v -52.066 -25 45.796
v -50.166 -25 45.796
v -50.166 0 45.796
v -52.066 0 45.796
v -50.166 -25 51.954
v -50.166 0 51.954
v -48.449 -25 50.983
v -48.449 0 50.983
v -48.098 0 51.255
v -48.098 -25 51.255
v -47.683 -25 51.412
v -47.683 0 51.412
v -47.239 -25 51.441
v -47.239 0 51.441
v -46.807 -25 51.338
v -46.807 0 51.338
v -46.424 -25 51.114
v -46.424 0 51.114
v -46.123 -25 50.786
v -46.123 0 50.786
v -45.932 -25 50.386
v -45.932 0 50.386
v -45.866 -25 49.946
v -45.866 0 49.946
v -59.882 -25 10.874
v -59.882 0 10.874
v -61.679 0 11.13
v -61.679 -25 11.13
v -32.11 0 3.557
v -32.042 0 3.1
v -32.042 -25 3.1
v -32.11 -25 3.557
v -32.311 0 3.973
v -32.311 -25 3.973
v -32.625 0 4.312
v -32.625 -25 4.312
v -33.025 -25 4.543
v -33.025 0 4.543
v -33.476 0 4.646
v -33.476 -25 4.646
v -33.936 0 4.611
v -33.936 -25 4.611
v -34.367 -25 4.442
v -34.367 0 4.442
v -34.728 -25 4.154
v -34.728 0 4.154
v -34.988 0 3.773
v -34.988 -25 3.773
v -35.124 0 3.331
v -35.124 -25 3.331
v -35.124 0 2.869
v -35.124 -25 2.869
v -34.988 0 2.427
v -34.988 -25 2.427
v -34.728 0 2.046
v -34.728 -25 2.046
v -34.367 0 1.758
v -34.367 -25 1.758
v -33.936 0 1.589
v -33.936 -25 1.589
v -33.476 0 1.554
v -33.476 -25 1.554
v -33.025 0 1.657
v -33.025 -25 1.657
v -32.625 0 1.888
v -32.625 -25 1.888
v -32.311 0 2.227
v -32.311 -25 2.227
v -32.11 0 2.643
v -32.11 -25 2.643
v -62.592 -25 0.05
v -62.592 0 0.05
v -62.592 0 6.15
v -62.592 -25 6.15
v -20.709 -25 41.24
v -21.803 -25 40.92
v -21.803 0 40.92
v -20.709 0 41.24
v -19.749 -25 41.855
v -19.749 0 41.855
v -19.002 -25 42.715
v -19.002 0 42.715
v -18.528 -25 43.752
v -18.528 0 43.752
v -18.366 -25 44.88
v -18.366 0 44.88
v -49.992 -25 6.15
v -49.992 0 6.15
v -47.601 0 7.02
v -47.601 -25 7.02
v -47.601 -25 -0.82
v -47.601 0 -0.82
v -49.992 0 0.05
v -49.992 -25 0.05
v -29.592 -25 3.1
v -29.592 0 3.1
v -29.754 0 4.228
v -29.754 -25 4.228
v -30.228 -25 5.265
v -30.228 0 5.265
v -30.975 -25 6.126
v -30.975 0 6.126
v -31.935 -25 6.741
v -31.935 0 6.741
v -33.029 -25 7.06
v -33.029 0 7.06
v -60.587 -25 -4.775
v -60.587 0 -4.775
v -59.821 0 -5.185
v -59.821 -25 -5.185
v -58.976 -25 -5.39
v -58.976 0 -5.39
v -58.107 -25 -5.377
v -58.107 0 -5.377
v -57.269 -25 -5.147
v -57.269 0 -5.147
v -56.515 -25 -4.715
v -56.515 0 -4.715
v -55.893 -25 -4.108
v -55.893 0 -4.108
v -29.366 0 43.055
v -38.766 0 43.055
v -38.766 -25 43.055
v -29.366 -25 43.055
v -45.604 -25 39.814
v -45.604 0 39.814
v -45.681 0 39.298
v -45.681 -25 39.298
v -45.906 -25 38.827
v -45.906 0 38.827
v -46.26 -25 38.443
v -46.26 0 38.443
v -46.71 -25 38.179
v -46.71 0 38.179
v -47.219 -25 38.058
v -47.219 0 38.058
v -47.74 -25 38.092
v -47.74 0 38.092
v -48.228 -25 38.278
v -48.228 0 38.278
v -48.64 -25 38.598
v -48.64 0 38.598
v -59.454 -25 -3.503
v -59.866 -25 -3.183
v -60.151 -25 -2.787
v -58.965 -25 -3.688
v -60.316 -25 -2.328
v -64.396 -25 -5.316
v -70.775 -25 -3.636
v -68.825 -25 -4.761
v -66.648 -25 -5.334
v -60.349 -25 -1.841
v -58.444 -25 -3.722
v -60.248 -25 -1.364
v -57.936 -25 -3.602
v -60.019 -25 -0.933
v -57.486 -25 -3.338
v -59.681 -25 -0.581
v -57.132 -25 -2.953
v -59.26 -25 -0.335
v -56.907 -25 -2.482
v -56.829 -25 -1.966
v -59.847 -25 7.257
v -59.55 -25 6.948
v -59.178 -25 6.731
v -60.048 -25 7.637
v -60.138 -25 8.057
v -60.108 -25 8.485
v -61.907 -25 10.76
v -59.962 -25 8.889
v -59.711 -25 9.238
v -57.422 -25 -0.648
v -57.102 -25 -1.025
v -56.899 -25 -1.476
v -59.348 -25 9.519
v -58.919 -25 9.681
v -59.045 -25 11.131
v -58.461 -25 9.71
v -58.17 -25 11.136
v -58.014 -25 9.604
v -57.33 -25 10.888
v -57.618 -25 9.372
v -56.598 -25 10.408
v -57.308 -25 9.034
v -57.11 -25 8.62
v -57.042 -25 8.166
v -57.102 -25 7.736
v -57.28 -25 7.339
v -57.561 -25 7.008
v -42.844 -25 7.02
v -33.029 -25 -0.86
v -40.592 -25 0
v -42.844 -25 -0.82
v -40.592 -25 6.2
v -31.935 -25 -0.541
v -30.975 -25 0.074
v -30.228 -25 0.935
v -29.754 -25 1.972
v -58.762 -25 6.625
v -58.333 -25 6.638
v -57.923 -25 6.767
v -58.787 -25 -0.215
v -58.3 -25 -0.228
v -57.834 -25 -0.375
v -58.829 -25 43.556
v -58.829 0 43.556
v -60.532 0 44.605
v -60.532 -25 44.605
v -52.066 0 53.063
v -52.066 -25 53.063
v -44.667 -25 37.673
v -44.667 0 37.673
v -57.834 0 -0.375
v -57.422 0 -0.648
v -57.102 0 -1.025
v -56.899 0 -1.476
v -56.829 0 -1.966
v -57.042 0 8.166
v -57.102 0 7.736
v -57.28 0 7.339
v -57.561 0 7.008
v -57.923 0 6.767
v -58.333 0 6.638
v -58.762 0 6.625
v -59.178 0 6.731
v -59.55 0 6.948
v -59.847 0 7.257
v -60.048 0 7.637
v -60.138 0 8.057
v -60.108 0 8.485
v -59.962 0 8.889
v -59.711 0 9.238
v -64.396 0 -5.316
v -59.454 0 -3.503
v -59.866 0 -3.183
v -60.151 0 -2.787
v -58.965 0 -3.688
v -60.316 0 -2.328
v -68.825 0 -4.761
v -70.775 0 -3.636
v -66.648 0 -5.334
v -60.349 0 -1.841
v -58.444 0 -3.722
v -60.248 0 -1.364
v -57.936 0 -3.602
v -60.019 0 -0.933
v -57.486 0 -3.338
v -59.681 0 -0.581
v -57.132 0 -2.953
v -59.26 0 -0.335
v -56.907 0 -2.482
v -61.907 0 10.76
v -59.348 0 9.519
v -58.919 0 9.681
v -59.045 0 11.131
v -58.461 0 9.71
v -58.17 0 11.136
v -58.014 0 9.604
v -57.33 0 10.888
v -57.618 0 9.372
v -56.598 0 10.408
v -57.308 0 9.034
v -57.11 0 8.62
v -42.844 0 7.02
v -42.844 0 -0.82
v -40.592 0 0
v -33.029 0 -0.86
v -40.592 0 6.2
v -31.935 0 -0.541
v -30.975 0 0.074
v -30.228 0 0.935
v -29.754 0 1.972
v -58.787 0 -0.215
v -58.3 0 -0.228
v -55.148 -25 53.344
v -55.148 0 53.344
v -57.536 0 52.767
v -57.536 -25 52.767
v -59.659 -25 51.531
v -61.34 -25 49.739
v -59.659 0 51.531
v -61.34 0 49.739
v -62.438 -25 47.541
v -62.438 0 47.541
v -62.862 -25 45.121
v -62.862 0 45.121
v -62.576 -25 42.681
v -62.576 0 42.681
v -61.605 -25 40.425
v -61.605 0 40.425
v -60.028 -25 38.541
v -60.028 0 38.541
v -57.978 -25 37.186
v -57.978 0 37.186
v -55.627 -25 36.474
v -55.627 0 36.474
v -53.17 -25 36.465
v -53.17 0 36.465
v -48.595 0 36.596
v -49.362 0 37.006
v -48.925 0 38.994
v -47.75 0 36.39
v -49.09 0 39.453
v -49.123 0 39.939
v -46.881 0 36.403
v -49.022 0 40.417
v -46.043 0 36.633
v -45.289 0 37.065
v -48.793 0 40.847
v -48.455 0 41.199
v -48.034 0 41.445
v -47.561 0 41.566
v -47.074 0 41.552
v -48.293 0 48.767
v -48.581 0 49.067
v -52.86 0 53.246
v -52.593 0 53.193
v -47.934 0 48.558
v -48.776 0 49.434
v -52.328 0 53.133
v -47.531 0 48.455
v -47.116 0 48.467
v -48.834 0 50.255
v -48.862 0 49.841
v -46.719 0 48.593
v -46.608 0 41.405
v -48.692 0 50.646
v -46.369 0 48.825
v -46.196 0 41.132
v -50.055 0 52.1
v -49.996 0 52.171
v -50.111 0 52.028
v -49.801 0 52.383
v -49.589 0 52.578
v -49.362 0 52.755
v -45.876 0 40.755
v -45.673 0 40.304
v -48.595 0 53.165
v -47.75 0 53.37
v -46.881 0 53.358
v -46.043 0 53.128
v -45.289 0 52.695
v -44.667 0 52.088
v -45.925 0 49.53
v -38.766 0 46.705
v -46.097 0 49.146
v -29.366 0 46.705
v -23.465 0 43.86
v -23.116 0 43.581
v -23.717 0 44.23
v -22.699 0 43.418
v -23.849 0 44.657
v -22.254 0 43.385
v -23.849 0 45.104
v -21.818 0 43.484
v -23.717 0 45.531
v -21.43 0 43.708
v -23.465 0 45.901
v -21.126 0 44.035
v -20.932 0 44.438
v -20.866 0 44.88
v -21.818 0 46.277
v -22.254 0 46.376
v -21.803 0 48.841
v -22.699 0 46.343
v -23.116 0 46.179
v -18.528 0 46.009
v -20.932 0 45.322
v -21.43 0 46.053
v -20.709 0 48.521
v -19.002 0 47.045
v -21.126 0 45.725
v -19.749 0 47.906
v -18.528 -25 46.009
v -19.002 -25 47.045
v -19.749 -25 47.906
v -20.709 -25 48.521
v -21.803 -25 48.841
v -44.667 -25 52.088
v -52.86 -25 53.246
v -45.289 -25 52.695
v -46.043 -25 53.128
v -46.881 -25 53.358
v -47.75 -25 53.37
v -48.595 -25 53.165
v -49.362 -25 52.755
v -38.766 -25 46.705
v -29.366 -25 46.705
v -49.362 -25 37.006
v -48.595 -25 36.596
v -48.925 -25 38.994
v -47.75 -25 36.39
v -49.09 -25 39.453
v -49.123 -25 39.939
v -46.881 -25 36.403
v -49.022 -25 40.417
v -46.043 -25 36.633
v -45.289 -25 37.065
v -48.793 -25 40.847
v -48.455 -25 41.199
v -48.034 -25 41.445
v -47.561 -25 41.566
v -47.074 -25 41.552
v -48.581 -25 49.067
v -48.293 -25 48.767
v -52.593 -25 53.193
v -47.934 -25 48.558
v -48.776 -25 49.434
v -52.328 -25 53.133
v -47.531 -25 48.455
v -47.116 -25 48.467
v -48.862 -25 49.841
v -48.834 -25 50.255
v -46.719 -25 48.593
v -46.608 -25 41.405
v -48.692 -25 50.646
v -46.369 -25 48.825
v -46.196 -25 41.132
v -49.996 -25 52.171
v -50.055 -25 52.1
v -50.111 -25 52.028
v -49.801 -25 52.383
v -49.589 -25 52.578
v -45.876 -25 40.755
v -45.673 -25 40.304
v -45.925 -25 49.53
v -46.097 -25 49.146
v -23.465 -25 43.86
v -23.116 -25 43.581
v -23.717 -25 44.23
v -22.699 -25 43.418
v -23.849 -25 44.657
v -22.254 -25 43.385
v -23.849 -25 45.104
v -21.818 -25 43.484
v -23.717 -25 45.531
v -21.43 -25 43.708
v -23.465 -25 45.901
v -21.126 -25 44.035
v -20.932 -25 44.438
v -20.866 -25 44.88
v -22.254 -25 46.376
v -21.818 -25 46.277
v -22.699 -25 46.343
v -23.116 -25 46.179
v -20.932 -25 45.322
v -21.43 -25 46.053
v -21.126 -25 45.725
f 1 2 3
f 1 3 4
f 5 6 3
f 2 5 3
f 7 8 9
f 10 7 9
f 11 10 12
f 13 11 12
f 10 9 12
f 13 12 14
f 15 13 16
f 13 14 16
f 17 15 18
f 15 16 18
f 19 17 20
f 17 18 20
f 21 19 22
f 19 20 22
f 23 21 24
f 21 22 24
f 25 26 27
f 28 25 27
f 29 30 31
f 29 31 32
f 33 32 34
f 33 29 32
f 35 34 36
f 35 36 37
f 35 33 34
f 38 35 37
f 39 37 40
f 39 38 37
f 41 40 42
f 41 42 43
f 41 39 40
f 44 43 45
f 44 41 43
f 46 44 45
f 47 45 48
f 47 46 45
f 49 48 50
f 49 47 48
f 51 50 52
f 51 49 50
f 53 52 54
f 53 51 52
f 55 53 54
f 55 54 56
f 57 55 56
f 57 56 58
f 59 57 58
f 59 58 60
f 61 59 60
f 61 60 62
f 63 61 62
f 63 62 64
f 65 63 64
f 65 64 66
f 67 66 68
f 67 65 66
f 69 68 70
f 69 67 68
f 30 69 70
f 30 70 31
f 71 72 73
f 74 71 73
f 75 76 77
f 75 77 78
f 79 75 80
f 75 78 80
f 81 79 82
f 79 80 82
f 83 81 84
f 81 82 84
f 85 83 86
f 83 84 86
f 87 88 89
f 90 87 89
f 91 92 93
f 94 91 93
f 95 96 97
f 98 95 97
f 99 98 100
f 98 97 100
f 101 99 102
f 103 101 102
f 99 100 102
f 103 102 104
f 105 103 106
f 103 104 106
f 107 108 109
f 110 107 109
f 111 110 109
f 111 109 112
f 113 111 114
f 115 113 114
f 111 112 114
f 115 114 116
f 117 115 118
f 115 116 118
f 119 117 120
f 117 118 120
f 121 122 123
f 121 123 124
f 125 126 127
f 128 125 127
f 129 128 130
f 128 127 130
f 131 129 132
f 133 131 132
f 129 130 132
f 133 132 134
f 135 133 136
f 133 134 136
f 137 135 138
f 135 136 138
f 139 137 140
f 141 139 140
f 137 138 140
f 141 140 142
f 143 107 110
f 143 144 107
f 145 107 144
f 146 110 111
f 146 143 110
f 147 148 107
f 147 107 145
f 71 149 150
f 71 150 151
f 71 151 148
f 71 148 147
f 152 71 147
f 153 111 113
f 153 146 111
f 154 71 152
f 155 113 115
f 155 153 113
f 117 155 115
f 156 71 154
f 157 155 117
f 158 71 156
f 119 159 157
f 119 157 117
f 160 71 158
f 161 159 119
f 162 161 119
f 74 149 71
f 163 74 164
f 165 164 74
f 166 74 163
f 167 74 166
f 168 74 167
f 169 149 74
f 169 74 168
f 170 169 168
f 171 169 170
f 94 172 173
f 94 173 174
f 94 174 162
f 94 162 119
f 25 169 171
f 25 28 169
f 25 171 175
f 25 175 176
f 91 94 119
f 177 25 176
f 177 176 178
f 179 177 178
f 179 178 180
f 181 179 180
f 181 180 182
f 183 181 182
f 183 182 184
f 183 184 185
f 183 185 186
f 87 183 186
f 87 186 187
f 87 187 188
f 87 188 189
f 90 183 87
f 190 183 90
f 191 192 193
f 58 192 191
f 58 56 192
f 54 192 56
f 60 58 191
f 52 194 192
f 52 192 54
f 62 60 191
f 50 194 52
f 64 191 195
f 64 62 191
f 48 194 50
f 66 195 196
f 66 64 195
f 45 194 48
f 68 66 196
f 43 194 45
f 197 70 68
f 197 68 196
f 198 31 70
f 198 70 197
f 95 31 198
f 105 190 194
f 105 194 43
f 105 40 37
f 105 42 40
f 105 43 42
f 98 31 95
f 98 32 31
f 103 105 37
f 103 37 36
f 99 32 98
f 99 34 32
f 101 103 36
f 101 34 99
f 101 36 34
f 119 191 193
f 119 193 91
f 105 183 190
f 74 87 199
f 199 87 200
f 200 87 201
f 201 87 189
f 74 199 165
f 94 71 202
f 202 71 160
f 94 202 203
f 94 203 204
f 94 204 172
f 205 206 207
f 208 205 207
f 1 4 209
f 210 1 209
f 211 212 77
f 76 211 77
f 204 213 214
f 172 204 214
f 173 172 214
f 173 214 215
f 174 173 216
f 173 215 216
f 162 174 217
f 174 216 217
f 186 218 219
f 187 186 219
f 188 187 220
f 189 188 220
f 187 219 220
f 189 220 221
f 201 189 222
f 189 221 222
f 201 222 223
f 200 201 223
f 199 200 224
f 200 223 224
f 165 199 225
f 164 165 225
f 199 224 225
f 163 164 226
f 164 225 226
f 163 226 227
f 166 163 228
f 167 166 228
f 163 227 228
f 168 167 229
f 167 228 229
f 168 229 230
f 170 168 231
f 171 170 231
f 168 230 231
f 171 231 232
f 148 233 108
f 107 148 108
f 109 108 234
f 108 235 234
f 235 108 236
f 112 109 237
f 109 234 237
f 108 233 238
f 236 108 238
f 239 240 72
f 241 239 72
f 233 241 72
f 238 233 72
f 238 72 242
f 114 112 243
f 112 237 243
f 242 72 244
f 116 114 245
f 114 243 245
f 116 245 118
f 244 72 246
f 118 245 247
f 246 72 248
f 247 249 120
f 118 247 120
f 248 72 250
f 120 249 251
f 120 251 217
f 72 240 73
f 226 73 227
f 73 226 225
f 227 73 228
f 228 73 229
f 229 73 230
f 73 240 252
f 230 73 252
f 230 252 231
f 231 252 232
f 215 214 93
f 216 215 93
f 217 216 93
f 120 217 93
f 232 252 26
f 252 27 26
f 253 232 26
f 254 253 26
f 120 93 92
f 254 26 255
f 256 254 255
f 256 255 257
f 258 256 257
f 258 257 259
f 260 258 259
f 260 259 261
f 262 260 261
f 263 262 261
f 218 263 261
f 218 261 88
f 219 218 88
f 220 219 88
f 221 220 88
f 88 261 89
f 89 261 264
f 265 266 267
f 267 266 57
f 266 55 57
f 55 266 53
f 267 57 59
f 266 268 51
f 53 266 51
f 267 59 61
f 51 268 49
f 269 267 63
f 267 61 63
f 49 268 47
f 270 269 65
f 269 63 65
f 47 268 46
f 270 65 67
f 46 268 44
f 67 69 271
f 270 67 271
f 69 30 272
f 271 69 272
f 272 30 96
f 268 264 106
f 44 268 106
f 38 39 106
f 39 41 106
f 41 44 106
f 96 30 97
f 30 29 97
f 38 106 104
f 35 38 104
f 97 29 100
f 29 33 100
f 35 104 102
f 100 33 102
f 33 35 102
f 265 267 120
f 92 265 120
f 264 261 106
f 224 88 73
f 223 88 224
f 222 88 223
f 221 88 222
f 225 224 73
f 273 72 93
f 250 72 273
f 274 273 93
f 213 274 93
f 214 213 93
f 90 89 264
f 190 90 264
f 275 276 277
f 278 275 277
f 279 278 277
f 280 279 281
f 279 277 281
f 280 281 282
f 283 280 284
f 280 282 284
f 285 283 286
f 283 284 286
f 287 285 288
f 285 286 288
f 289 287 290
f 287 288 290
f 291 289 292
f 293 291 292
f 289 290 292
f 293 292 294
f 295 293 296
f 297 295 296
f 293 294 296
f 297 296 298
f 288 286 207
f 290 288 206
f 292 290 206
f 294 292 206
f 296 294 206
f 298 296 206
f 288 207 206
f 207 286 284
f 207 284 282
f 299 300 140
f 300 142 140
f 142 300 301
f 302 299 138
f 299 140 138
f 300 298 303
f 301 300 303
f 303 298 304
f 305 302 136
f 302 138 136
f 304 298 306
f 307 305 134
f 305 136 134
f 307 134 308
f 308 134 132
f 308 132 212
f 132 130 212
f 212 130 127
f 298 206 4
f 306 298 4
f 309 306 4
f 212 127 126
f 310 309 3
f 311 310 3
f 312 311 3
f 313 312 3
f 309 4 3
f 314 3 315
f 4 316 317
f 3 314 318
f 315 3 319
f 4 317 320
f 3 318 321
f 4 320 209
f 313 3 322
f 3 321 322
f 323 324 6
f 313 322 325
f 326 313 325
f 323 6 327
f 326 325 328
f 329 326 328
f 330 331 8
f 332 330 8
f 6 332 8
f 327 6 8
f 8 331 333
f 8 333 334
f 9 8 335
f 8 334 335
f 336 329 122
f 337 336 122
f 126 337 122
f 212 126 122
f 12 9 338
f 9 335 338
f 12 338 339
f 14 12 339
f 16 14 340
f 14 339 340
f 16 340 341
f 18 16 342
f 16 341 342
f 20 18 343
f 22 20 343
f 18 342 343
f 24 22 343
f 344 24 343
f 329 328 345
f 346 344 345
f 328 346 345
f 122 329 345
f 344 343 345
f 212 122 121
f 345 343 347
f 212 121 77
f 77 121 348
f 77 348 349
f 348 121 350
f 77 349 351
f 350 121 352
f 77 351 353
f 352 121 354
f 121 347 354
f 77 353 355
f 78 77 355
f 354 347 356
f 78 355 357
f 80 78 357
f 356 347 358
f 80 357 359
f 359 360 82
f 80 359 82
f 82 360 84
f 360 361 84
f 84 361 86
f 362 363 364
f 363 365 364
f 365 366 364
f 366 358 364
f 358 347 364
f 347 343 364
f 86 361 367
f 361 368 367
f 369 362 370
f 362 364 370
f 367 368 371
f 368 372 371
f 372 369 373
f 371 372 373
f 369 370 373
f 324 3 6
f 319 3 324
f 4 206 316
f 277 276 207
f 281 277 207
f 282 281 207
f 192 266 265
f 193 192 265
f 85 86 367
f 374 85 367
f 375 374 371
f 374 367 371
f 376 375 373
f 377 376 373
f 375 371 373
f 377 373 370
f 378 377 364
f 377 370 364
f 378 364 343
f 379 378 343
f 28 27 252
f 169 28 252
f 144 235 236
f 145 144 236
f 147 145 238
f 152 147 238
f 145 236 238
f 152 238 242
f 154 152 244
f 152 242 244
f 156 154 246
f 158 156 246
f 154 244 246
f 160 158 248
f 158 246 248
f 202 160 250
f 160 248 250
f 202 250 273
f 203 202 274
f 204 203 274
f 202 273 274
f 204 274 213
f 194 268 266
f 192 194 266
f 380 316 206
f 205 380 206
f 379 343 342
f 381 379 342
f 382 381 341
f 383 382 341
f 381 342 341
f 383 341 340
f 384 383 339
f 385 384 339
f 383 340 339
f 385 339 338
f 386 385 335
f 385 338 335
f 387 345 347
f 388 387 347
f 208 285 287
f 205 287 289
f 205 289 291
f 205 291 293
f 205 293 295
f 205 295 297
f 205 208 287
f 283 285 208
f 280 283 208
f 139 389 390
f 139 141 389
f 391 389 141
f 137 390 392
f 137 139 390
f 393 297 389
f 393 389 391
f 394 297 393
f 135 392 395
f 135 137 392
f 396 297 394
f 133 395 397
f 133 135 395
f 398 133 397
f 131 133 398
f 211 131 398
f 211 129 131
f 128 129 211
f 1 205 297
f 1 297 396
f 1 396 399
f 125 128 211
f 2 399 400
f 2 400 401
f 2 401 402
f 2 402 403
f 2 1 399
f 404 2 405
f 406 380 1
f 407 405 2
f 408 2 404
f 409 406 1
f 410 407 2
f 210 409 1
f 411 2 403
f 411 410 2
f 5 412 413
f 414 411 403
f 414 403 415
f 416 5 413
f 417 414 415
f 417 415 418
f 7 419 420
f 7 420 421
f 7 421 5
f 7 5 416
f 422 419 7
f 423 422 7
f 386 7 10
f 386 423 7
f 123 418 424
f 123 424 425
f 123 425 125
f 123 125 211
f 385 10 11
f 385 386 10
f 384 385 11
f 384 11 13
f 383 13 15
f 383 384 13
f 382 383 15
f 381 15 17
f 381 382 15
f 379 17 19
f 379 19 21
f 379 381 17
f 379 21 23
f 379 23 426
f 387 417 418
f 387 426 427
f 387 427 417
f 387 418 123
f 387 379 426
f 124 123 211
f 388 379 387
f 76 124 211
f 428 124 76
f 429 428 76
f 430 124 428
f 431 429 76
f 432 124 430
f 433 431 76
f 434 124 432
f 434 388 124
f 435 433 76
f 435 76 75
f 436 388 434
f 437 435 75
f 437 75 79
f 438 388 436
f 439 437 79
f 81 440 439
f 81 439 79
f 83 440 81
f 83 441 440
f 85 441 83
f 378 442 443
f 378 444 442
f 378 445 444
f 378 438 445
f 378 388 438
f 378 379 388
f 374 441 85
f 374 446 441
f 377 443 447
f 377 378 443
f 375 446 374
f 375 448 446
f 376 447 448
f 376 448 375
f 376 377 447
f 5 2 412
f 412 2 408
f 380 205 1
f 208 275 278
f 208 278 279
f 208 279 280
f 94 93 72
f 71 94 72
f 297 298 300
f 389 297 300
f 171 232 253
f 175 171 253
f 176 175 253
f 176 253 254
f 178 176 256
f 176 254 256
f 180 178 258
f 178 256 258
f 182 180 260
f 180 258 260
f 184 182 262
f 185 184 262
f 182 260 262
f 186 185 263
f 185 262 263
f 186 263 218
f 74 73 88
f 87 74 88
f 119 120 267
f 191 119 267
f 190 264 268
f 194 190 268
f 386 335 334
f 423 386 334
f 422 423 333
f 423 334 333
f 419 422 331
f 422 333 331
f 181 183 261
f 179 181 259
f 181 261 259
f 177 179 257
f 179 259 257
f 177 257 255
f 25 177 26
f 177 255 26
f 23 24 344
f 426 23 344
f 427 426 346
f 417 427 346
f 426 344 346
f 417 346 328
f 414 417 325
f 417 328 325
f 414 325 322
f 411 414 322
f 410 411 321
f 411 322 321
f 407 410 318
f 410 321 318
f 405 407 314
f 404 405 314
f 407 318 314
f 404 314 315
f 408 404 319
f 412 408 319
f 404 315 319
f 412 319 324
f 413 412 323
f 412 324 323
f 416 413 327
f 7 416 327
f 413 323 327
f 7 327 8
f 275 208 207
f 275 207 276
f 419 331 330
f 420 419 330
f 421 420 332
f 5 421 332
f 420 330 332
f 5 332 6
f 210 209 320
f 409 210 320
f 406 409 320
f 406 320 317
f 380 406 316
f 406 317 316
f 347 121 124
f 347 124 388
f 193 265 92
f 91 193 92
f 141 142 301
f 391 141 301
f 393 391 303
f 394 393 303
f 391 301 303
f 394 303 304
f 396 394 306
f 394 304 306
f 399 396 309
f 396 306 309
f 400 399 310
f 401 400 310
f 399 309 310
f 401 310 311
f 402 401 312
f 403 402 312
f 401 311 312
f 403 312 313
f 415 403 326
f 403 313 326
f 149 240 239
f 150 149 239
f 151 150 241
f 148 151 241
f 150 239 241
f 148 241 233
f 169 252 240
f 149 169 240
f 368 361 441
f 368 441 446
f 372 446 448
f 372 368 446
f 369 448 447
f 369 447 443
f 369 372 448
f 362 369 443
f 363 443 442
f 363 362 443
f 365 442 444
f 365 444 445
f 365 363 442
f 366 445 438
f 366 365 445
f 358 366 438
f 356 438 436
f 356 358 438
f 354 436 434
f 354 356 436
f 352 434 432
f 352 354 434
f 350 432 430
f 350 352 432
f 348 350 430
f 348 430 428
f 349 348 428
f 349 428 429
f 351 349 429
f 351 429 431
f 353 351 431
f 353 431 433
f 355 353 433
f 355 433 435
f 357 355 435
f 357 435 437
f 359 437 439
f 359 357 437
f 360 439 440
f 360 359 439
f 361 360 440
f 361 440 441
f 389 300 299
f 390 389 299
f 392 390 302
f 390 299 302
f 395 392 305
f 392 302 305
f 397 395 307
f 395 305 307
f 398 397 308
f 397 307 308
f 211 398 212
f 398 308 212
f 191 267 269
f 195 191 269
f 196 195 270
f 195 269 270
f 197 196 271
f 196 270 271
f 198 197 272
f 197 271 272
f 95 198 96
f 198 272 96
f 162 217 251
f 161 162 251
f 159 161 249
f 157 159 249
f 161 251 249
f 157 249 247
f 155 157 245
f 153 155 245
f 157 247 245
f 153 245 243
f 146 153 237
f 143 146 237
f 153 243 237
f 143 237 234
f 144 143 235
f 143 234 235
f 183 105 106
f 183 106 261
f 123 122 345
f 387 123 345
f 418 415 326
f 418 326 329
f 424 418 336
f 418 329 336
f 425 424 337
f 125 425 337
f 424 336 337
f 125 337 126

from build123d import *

# Parameters (mm, degrees)
F0_R     = 1.5
F0_W     = 9.4
F0_H     = 3.65
F1_DEPTH = 25
F0_R_2   = 1.55


with BuildPart() as f1:
    # F0 (on Front) → F1 (new body)
    with BuildSketch(Plane.XZ):
        with BuildLine():
            Line((-49.3615542974, 52.7548726737), (-44.6667412439, 52.0880382086))
            ThreePointArc((-44.6667412439, 52.0880382086), (-46.8811865433, 53.357561984), (-49.3615542974, 52.7548726737))
        make_face()
        with BuildLine():
            ThreePointArc((-49.3615542974, 37.0057918546), (-46.8811865433, 36.4031025443), (-44.6667412439, 37.6726263196))
            Line((-44.6667412439, 37.6726263196), (-49.3615542974, 37.0057918546))
        make_face()
        with BuildLine():
            ThreePointArc((-49.3615542974, 37.0057918546), (-49.6973054486, 37.2776069924), (-49.9964053831, 37.5892984006))
            ThreePointArc((-49.9964053831, 37.5892984006), (-51.5271600553, 36.8683017678), (-53.1703977707, 36.4647973419))
            Line((-53.1703977707, 36.4647973419), (-49.3615542974, 37.0057918546))
        make_face()
        with BuildLine():
            ThreePointArc((-18.3657102707, 44.8803322641), (-19.3449487773, 47.5023543846), (-21.8032102707, 48.8405839922))
            ThreePointArc((-21.8032102707, 48.8405839922), (-26.3657102707, 44.8803322641), (-21.8032102707, 40.920080536))
            ThreePointArc((-21.8032102707, 40.920080536), (-19.3449487773, 42.2583101437), (-18.3657102707, 44.8803322641))
        make_face()
        with Locations((-22.3657102707, 44.8803322641)):
            Circle(F0_R, mode=Mode.SUBTRACT)
        with BuildLine():
            ThreePointArc((-46.7192717295, 48.5927408672), (-46.3438242586, 47.690909573), (-46.0743279136, 46.751956855))
            ThreePointArc((-46.0743279136, 46.751956855), (-44.5090561942, 48.0198994141), (-43.9202082096, 49.9462981111))
            ThreePointArc((-43.9202082096, 49.9462981111), (-44.1121900389, 51.0803574368), (-44.6667412439, 52.0880382086))
            Line((-44.6667412439, 52.0880382086), (-49.3615542974, 52.7548726737))
            ThreePointArc((-49.3615542974, 52.7548726737), (-49.6973054486, 52.4830575358), (-49.9964053831, 52.1713661277))
            ThreePointArc((-49.9964053831, 52.1713661277), (-49.1887221415, 51.6219043293), (-48.4494153042, 50.9834014813))
            ThreePointArc((-48.4494153042, 50.9834014813), (-46.806942676, 51.3383393372), (-45.8657102707, 49.9462981111))
            ThreePointArc((-45.8657102707, 49.9462981111), (-46.096919939, 49.1461911844), (-46.7192717295, 48.5927408672))
        make_face()
        with BuildLine():
            ThreePointArc((-43.9202082096, 39.8143664172), (-44.5090561942, 41.7407651142), (-46.0743279136, 43.0087076733))
            ThreePointArc((-46.0743279136, 43.0087076733), (-46.3014397022, 42.1937842564), (-46.6084329672, 41.4054727221))
            ThreePointArc((-46.6084329672, 41.4054727221), (-45.875826677, 40.7552888716), (-45.6035842286, 39.8143664172))
            ThreePointArc((-45.6035842286, 39.8143664172), (-46.710391094, 38.1786265342), (-48.6404214365, 38.5977318658))
            ThreePointArc((-48.6404214365, 38.5977318658), (-49.2932907183, 38.0597340583), (-49.9964053831, 37.5892984006))
            ThreePointArc((-49.9964053831, 37.5892984006), (-49.6973054486, 37.2776069924), (-49.3615542974, 37.0057918546))
            Line((-49.3615542974, 37.0057918546), (-44.6667412439, 37.6726263196))
            ThreePointArc((-44.6667412439, 37.6726263196), (-44.1121900389, 38.6803070915), (-43.9202082096, 39.8143664172))
        make_face()
        with BuildLine():
            ThreePointArc((-46.0743279136, 46.751956855), (-45.9180256756, 45.8219399226), (-45.8657102707, 44.8803322641))
            ThreePointArc((-45.8657102707, 44.8803322641), (-45.9180256756, 43.9387246056), (-46.0743279136, 43.0087076733))
            ThreePointArc((-46.0743279136, 43.0087076733), (-44.5090561942, 41.7407651142), (-43.9202082096, 39.8143664172))
            ThreePointArc((-43.9202082096, 39.8143664172), (-44.1121900389, 38.6803070915), (-44.6667412439, 37.6726263196))
            Line((-44.6667412439, 37.6726263196), (-21.8032102707, 40.920080536))
            ThreePointArc((-21.8032102707, 40.920080536), (-26.3657102707, 44.8803322641), (-21.8032102707, 48.8405839922))
            Line((-21.8032102707, 48.8405839922), (-44.6667412439, 52.0880382086))
            ThreePointArc((-44.6667412439, 52.0880382086), (-44.1121900389, 51.0803574368), (-43.9202082096, 49.9462981111))
            ThreePointArc((-43.9202082096, 49.9462981111), (-44.5090561942, 48.0198994141), (-46.0743279136, 46.751956855))
        make_face()
        with Locations((-34.0657102707, 44.8803322641)):
            Rectangle(F0_W, F0_H, mode=Mode.SUBTRACT)
        with BuildLine():
            ThreePointArc((-46.0743279136, 43.0087076733), (-45.9180256756, 43.9387246056), (-45.8657102707, 44.8803322641))
            ThreePointArc((-45.8657102707, 44.8803322641), (-45.9180256756, 45.8219399226), (-46.0743279136, 46.751956855))
            ThreePointArc((-46.0743279136, 46.751956855), (-48.3253554138, 46.6371342209), (-50.1657102707, 47.9384424259))
            Line((-50.1657102707, 47.9384424259), (-50.1657102707, 45.7958671864))
            Line((-50.1657102707, 45.7958671864), (-52.0657102707, 45.7958671864))
            Line((-52.0657102707, 45.7958671864), (-52.0657102707, 53.0632412823))
            ThreePointArc((-52.0657102707, 53.0632412823), (-52.4606249782, 53.1640904709), (-52.8599201475, 53.2458923831))
            Line((-52.8599201475, 53.2458923831), (-58.8291358212, 43.555559183))
            Line((-58.8291358212, 43.555559183), (-60.5319868708, 44.604510232))
            Line((-60.5319868708, 44.604510232), (-55.1483494046, 53.3442247484))
            ThreePointArc((-55.1483494046, 53.3442247484), (-62.8079458881, 43.8910609262), (-53.1703977707, 36.4647973419))
            ThreePointArc((-53.1703977707, 36.4647973419), (-51.5271600553, 36.8683017678), (-49.9964053831, 37.5892984006))
            ThreePointArc((-49.9964053831, 37.5892984006), (-50.1569356074, 41.8344024496), (-46.0743279136, 43.0087076733))
        make_face()
        with BuildLine():
            ThreePointArc((-50.1657102707, 47.9384424259), (-48.3253554138, 46.6371342209), (-46.0743279136, 46.751956855))
            ThreePointArc((-46.0743279136, 46.751956855), (-46.3438242586, 47.690909573), (-46.7192717295, 48.5927408672))
            ThreePointArc((-46.7192717295, 48.5927408672), (-48.58087077, 49.066875027), (-48.4494153042, 50.9834014813))
            ThreePointArc((-48.4494153042, 50.9834014813), (-49.1887221415, 51.6219043293), (-49.9964053831, 52.1713661277))
            ThreePointArc((-49.9964053831, 52.1713661277), (-50.0832289275, 52.0644522137), (-50.1657102707, 51.9541537963))
            Line((-50.1657102707, 51.9541537963), (-50.1657102707, 47.9384424259))
        make_face()
        with BuildLine():
            ThreePointArc((-46.6084329672, 41.4054727221), (-46.3014397022, 42.1937842564), (-46.0743279136, 43.0087076733))
            ThreePointArc((-46.0743279136, 43.0087076733), (-50.1569356074, 41.8344024496), (-49.9964053831, 37.5892984006))
            ThreePointArc((-49.9964053831, 37.5892984006), (-49.2932907183, 38.0597340583), (-48.6404214365, 38.5977318658))
            ThreePointArc((-48.6404214365, 38.5977318658), (-48.7932209115, 40.8474692961), (-46.6084329672, 41.4054727221))
        make_face()
    extrude(amount=F1_DEPTH)


with BuildPart() as f1b:
    # F0 (on Front) → F1, piece 2 (new body)
    with BuildSketch(Plane.XZ):
        with BuildLine():
            ThreePointArc((-56.5981590856, 10.4079229965), (-58.1696802178, 11.1361546431), (-59.88182635, 10.8743233576))
            Line((-59.88182635, 10.8743233576), (-56.5981590856, 10.4079229965))
        make_face()
        with BuildLine():
            Line((-55.8925861911, -4.1077059445), (-60.5873992446, -4.7745404096))
            ThreePointArc((-60.5873992446, -4.7745404096), (-58.1070314905, -5.3772297198), (-55.8925861911, -4.1077059445))
        make_face()
        with BuildLine():
            ThreePointArc((-61.2222503302, -4.1910338635), (-62.7530050024, -4.9120304964), (-64.3962427178, -5.3155349222))
            Line((-64.3962427178, -5.3155349222), (-60.5873992446, -4.7745404096))
            ThreePointArc((-60.5873992446, -4.7745404096), (-60.9231503958, -4.5027252717), (-61.2222503302, -4.1910338635))
        make_face()
        with BuildLine():
            ThreePointArc((-29.5915552178, 3.1), (-30.5707937244, 5.7220221204), (-33.0290552178, 7.0602517281))
            ThreePointArc((-33.0290552178, 7.0602517281), (-37.5915552178, 3.1), (-33.0290552178, -0.8602517281))
            ThreePointArc((-33.0290552178, -0.8602517281), (-30.5707937244, 0.4779778796), (-29.5915552178, 3.1))
        make_face()
        with Locations((-33.5915552178, 3.1)):
            Circle(F0_R_2, mode=Mode.SUBTRACT)
        with BuildLine():
            Line((-61.6794219157, 11.1296474065), (-61.9071433305, 10.7599679532))
            ThreePointArc((-61.9071433305, 10.7599679532), (-61.3636857461, 10.4739487203), (-60.8422981172, 10.1494366436))
            ThreePointArc((-60.8422981172, 10.1494366436), (-60.3987796864, 10.5605304671), (-59.88182635, 10.8743233576))
            Line((-59.88182635, 10.8743233576), (-61.6794219157, 11.1296474065))
        make_face()
        with BuildLine():
            ThreePointArc((-59.88182635, 10.8743233576), (-60.3987796864, 10.5605304671), (-60.8422981172, 10.1494366436))
            ThreePointArc((-60.8422981172, 10.1494366436), (-60.2572684434, 9.7178081423), (-59.7112630741, 9.2377654162))
            ThreePointArc((-59.7112630741, 9.2377654162), (-58.0140810527, 9.6043759375), (-57.0415552178, 8.165965847))
            ThreePointArc((-57.0415552178, 8.165965847), (-57.2804253293, 7.3392625052), (-57.9234112376, 6.7673652529))
            ThreePointArc((-57.9234112376, 6.7673652529), (-57.7844053967, 6.4613110048), (-57.6576091631, 6.15))
            Line((-57.6576091631, 6.15), (-56.3698707884, 6.15))
            ThreePointArc((-56.3698707884, 6.15), (-55.7928900639, 7.0854690372), (-55.5915552178, 8.165965847))
            ThreePointArc((-55.5915552178, 8.165965847), (-55.8547515716, 9.3947480904), (-56.5981590856, 10.4079229965))
            Line((-56.5981590856, 10.4079229965), (-59.88182635, 10.8743233576))
        make_face()
        with BuildLine():
            Line((-61.9071433305, 10.7599679532), (-70.7752651046, -3.6364049619))
            ThreePointArc((-70.7752651046, -3.6364049619), (-67.7552783481, -5.119994052), (-64.3962427178, -5.3155349222))
            ThreePointArc((-64.3962427178, -5.3155349222), (-62.7530050024, -4.9120304964), (-61.2222503302, -4.1910338635))
            ThreePointArc((-61.2222503302, -4.1910338635), (-62.0345005853, -2.0986747351), (-61.3857216689, 0.05))
            Line((-61.3857216689, 0.05), (-62.5915552178, 0.05))
            Line((-62.5915552178, 0.05), (-62.5915552178, 6.15))
            Line((-62.5915552178, 6.15), (-60.8132396472, 6.15))
            ThreePointArc((-60.8132396472, 6.15), (-61.5914760367, 8.1441695), (-60.8422981172, 10.1494366436))
            ThreePointArc((-60.8422981172, 10.1494366436), (-61.3636857461, 10.4739487203), (-61.9071433305, 10.7599679532))
        make_face()
        with BuildLine():
            ThreePointArc((-59.8662663837, -3.1826003984), (-60.5191356655, -3.7205982058), (-61.2222503302, -4.1910338635))
            ThreePointArc((-61.2222503302, -4.1910338635), (-60.9231503958, -4.5027252717), (-60.5873992446, -4.7745404096))
            Line((-60.5873992446, -4.7745404096), (-55.8925861911, -4.1077059445))
            ThreePointArc((-55.8925861911, -4.1077059445), (-55.3380349861, -3.1000251727), (-55.1460531568, -1.965965847))
            ThreePointArc((-55.1460531568, -1.965965847), (-55.3129281638, -0.9066787786), (-55.7973887667, 0.05))
            Line((-55.7973887667, 0.05), (-57.6576091631, 0.05))
            ThreePointArc((-57.6576091631, 0.05), (-57.7430681644, -0.1636254339), (-57.8342779143, -0.374859542))
            ThreePointArc((-57.8342779143, -0.374859542), (-57.1016716241, -1.0250433925), (-56.8294291758, -1.965965847))
            ThreePointArc((-56.8294291758, -1.965965847), (-57.9362360412, -3.6017057299), (-59.8662663837, -3.1826003984))
        make_face()
        with BuildLine():
            Line((-33.0290552178, 7.0602517281), (-56.5981590856, 10.4079229965))
            ThreePointArc((-56.5981590856, 10.4079229965), (-55.8547515716, 9.3947480904), (-55.5915552178, 8.165965847))
            ThreePointArc((-55.5915552178, 8.165965847), (-55.7928900639, 7.0854690372), (-56.3698707884, 6.15))
            Line((-56.3698707884, 6.15), (-49.9915552178, 6.15))
            Line((-49.9915552178, 6.15), (-49.9915552178, 7.02))
            Line((-49.9915552178, 7.02), (-47.6012498629, 7.02))
            Line((-47.6012498629, 7.02), (-42.8444867018, 7.02))
            Line((-42.8444867018, 7.02), (-40.5915552178, 7.02))
            Line((-40.5915552178, 7.02), (-40.5915552178, 6.2))
            Line((-40.5915552178, 6.2), (-40.5915552178, 0))
            Line((-40.5915552178, 0), (-40.5915552178, -0.82))
            Line((-40.5915552178, -0.82), (-42.8444867018, -0.82))
            Line((-42.8444867018, -0.82), (-47.6012498629, -0.82))
            Line((-47.6012498629, -0.82), (-49.9915552178, -0.82))
            Line((-49.9915552178, -0.82), (-49.9915552178, 0.05))
            Line((-49.9915552178, 0.05), (-55.7973887667, 0.05))
            ThreePointArc((-55.7973887667, 0.05), (-55.3129281638, -0.9066787786), (-55.1460531568, -1.965965847))
            ThreePointArc((-55.1460531568, -1.965965847), (-55.3380349861, -3.1000251727), (-55.8925861911, -4.1077059445))
            Line((-55.8925861911, -4.1077059445), (-33.0290552178, -0.8602517281))
            ThreePointArc((-33.0290552178, -0.8602517281), (-37.5915552178, 3.1), (-33.0290552178, 7.0602517281))
        make_face()
        with BuildLine():
            ThreePointArc((-61.3857216689, 0.05), (-62.0345005853, -2.0986747351), (-61.2222503302, -4.1910338635))
            ThreePointArc((-61.2222503302, -4.1910338635), (-60.5191356655, -3.7205982058), (-59.8662663837, -3.1826003984))
            ThreePointArc((-59.8662663837, -3.1826003984), (-60.0190658586, -0.932862968), (-57.8342779143, -0.374859542))
            ThreePointArc((-57.8342779143, -0.374859542), (-57.7430681644, -0.1636254339), (-57.6576091631, 0.05))
            Line((-57.6576091631, 0.05), (-61.3857216689, 0.05))
        make_face()
        with BuildLine():
            ThreePointArc((-59.7112630741, 9.2377654162), (-60.2572684434, 9.7178081423), (-60.8422981172, 10.1494366436))
            ThreePointArc((-60.8422981172, 10.1494366436), (-61.5914760367, 8.1441695), (-60.8132396472, 6.15))
            Line((-60.8132396472, 6.15), (-57.6576091631, 6.15))
            ThreePointArc((-57.6576091631, 6.15), (-57.7844053967, 6.4613110048), (-57.9234112376, 6.7673652529))
            ThreePointArc((-57.9234112376, 6.7673652529), (-59.8472210672, 7.2572286601), (-59.7112630741, 9.2377654162))
        make_face()
        Polygon((-40.5915552178, 0), (-42.8444867018, -0.82), (-40.5915552178, -0.82), align=None)
        Polygon((-47.6012498629, -0.82), (-49.9915552178, 0.05), (-49.9915552178, -0.82), align=None)
        Polygon((-40.5915552178, 7.02), (-42.8444867018, 7.02), (-40.5915552178, 6.2), align=None)
        Polygon((-49.9915552178, 7.02), (-49.9915552178, 6.15), (-47.6012498629, 7.02), align=None)
    extrude(amount=F1_DEPTH)


solid = Compound([f1.part, f1b.part])
